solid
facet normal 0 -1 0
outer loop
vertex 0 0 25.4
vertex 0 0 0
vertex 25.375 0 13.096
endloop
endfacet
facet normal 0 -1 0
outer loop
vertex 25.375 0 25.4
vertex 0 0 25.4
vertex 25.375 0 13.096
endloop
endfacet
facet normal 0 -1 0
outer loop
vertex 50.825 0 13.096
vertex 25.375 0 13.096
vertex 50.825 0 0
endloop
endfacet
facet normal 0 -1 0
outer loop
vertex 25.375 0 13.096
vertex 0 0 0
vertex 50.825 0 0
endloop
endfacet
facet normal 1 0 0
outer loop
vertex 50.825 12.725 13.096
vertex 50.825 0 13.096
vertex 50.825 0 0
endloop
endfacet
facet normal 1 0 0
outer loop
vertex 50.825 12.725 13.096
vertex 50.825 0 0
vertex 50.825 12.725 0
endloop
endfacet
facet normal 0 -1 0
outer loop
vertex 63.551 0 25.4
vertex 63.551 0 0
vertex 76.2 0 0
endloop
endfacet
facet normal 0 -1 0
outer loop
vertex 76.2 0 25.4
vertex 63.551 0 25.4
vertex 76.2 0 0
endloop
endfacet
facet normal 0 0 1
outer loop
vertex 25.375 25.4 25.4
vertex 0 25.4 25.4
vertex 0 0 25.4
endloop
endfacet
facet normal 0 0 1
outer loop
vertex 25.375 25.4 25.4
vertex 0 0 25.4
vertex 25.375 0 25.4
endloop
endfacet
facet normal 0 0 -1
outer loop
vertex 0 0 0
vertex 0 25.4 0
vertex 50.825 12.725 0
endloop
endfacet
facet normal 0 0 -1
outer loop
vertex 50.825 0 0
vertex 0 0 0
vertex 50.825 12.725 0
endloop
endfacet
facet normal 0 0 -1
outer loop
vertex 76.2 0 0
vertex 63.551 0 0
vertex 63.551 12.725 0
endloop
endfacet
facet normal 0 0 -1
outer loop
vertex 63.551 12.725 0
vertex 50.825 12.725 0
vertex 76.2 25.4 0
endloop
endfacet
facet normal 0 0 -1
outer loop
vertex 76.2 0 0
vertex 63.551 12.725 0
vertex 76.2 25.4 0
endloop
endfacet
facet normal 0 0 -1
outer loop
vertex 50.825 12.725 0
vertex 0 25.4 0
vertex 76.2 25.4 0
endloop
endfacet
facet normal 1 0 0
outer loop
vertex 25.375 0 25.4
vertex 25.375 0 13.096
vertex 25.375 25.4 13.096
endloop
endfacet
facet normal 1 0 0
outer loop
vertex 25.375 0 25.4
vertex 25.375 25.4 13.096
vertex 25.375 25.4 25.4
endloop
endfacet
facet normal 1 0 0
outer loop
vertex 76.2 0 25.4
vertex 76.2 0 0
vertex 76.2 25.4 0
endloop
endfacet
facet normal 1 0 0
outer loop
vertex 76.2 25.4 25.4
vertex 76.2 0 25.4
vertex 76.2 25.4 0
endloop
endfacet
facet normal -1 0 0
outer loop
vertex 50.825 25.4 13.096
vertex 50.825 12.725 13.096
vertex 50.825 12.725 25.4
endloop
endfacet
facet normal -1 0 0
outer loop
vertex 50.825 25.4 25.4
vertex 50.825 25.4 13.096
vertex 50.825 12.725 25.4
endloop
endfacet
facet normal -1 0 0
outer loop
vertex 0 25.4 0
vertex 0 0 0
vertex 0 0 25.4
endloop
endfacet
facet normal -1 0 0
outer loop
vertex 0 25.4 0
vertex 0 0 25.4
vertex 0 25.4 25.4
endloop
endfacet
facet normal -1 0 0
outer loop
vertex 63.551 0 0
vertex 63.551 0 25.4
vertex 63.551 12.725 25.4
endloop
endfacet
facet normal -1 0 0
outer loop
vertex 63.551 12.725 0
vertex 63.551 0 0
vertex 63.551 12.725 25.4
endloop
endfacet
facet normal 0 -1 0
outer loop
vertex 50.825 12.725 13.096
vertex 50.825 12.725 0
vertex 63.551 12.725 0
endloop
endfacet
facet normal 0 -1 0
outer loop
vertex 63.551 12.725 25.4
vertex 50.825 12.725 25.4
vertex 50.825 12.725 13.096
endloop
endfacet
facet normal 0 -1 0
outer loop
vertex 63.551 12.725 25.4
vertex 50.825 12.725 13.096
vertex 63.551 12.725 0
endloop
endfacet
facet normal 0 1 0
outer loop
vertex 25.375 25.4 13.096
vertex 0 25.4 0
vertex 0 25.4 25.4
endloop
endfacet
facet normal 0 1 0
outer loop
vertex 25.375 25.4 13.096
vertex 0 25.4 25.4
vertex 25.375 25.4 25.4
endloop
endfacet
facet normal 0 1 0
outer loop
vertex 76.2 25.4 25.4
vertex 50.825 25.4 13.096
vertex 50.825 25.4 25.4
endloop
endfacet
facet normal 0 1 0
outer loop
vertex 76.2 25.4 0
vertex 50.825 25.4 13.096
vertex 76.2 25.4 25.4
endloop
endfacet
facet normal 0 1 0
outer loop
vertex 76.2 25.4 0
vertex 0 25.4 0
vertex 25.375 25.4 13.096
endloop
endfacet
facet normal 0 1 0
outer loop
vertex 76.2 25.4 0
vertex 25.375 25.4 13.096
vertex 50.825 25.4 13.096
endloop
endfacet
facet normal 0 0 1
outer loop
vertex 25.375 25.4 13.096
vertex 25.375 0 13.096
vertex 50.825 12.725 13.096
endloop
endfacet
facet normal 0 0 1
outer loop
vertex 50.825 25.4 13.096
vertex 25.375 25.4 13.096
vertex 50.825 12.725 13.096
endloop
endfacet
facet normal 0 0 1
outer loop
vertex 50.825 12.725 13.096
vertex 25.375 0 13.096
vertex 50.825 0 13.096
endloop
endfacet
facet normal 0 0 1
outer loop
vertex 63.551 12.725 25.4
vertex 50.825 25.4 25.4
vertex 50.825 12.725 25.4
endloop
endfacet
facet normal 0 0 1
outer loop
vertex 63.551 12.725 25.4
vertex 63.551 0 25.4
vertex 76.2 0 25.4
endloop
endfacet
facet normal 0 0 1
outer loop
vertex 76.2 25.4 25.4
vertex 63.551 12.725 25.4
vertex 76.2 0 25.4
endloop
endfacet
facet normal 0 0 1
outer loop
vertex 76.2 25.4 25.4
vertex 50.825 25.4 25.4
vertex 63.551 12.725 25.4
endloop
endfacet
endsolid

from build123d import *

# Parameters (mm, degrees)
F0_W     = 76.2
F0_H     = 25.4
F1_DEPTH = 25.4
F2_W     = 25.4508
F2_H     = 12.7254
F3_DEPTH = 25.4
F4_W     = 12.7254
F4_H     = 12.7254
F5_DEPTH = 25.4


with BuildPart() as f1:
    # F0 (on Top) → F1 (new body)
    with BuildSketch(Plane.XY):
        with Locations((38.1, 12.7)):
            Rectangle(F0_W, F0_H)
    extrude(amount=F1_DEPTH)

    # F2 (on Front) → F3 (cut)
    with BuildSketch(Plane.XZ):
        with Locations((38.1, 19.458432)):
            Rectangle(F2_W, F2_H)
    extrude(amount=-F3_DEPTH, mode=Mode.SUBTRACT)

    # F4 (on face) → F5 (cut)
    with BuildSketch(Plane.XY.offset(25.4)):
        with Locations((57.1881, 6.3627)):
            Rectangle(F4_W, F4_H)
    extrude(amount=-F5_DEPTH, mode=Mode.SUBTRACT)


solid = f1.part
